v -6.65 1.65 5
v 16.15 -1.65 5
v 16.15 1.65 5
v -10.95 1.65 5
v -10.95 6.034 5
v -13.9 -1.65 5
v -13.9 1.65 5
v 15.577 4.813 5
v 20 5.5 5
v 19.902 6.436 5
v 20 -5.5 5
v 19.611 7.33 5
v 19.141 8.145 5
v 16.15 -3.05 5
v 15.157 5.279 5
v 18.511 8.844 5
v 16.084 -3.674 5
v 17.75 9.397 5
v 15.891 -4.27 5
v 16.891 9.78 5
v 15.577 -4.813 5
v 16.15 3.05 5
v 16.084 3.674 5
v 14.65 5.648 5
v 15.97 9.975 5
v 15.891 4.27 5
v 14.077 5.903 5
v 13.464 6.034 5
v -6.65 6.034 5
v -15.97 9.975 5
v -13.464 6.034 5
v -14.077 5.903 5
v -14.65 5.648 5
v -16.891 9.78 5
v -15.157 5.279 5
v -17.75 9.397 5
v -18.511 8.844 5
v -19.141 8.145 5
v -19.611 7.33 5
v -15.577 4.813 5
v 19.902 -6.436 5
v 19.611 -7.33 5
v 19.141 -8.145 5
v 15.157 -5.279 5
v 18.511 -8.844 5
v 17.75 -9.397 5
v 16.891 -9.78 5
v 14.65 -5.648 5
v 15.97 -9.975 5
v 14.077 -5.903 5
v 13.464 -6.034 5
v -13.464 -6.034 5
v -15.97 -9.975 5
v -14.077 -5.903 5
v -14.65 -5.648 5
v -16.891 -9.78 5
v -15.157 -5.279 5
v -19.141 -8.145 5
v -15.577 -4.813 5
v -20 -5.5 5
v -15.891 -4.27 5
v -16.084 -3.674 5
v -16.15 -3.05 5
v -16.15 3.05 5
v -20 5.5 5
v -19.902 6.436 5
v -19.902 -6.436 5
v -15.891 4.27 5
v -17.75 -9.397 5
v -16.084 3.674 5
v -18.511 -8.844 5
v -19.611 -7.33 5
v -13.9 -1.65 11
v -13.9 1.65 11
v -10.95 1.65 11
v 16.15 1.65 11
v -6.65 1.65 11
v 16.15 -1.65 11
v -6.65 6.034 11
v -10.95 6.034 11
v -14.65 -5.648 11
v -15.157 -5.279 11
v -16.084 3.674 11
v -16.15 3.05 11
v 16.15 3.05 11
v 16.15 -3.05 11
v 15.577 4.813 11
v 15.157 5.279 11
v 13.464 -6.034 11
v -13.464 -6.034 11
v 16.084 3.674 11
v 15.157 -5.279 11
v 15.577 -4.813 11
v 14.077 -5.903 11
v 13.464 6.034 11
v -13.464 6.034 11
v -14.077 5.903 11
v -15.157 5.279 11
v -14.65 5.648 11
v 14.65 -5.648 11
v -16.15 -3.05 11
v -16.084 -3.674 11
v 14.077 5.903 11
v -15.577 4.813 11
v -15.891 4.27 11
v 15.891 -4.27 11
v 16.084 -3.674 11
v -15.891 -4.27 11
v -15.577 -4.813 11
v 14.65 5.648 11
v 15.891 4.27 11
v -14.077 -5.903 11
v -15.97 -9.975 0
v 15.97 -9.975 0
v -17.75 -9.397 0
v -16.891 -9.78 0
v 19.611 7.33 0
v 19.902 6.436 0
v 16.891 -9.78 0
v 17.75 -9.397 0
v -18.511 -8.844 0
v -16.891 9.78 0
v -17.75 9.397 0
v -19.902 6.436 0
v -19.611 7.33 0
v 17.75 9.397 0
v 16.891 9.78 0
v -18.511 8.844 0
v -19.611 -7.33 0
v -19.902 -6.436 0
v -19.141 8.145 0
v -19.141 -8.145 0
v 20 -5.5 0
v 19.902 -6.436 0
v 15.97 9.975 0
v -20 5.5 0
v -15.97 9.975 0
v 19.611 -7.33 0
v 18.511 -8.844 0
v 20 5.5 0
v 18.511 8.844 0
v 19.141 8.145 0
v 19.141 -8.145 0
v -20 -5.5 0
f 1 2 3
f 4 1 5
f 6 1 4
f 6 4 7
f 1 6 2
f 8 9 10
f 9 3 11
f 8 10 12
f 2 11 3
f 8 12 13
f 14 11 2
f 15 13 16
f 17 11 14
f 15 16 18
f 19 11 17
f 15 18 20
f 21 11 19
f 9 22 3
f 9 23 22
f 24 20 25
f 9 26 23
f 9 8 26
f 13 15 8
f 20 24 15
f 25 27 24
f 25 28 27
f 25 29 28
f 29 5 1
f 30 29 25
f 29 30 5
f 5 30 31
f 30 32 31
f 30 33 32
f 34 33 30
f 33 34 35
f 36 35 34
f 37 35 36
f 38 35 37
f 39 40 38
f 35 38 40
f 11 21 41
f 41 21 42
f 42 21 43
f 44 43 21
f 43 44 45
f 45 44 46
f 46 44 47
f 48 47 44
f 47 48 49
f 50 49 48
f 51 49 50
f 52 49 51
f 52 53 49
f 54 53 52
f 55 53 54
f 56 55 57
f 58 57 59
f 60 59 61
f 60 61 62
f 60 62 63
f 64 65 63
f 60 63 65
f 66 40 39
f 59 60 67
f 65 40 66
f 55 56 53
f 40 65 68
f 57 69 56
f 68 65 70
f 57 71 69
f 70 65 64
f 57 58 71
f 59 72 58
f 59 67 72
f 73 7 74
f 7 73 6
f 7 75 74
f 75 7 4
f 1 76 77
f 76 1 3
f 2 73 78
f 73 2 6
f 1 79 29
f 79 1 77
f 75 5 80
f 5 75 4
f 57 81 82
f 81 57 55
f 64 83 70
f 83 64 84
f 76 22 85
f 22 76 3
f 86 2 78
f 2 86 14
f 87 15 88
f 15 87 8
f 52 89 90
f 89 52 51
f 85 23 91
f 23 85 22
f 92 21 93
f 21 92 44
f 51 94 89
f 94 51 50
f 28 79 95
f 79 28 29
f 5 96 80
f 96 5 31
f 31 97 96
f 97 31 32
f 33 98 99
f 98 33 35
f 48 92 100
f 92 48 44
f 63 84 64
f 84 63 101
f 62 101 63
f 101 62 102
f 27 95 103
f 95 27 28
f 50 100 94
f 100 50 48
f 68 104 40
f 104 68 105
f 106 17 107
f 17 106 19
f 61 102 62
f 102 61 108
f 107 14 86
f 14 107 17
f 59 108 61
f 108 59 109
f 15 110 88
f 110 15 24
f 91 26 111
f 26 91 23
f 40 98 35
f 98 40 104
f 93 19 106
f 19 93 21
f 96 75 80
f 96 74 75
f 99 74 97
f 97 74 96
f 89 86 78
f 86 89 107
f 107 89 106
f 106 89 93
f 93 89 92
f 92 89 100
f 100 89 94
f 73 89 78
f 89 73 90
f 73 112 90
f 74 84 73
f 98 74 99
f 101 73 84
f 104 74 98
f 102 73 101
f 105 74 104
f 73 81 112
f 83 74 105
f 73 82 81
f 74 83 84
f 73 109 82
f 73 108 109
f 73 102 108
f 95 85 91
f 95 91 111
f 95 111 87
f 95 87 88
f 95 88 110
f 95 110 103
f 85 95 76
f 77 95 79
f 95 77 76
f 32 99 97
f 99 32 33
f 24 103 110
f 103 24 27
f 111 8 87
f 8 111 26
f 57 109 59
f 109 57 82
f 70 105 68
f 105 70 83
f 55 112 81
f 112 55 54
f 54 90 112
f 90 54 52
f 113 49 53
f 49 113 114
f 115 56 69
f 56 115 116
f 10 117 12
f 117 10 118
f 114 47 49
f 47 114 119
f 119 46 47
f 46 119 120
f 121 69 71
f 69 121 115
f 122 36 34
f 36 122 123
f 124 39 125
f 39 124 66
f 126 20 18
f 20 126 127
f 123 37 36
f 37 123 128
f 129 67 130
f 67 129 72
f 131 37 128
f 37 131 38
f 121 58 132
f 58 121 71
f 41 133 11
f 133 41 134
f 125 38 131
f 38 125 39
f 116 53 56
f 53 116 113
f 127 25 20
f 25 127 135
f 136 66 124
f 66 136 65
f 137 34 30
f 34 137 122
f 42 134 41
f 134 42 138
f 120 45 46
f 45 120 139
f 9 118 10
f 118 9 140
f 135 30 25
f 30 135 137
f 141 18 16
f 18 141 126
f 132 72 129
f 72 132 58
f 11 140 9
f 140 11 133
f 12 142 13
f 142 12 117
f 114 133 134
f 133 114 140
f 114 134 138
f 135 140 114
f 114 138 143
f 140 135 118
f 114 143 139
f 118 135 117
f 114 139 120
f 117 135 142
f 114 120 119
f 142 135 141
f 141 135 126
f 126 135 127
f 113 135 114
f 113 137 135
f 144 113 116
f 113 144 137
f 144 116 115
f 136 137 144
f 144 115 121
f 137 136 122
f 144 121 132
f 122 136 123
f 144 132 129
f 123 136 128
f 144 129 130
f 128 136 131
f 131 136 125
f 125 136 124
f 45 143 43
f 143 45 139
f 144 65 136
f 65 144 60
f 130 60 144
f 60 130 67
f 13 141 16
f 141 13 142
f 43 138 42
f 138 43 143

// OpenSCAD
//-- two rounded flat cubes with a slot in the middle
//-- rear feet have an extra slot at right angle
//-- also left foot is mirror of right foot

x1=40;

y1=20;

th=5;
  
//-- OK, now we define the cylinders that are going to be at
//-- the four corners of our rounded corners box.

//-- the radius of the cylinders
box_corner_radius=4.5;

//-- The centers of the four corner cylinders

P1=[x1/2-box_corner_radius,y1/2-box_corner_radius,0];
P2=[x1/2-box_corner_radius,-y1/2+box_corner_radius,0];
P3=[-x1/2+box_corner_radius,-y1/2+box_corner_radius,0];
P4=[-x1/2+box_corner_radius,y1/2-box_corner_radius,0];

translate([0,0,th/2]) {
  hull() {
    translate(P1)
      cylinder(r=box_corner_radius,h=th,$fn=30,center=true);
      
    translate(P2)
      cylinder(r=box_corner_radius,h=th,$fn=30,center=true);
      
    translate(P3)
      cylinder(r=box_corner_radius,h=th,$fn=30,center=true);
      
    translate(P4)
      cylinder(r=box_corner_radius,h=th,$fn=30,center=true);
  }
}

//-- OK, now we define the cylinders that are going to be at
//-- the four corners of our 2nd rounded corners box.
x2=35.3;

y2=15.1;

th2=6;
//-- the radius of the cylinders
bc2=3;

//-- slot size
x3=27.8;
y3=3.3;
th3=th2+1;

//-- 2nd slot size


//-- The centers of the four corner cylinders

PT1=[x2/2-box_corner_radius,y2/2-box_corner_radius,0];
PT2=[x2/2-box_corner_radius,-y2/2+box_corner_radius,0];
PT3=[-x2/2+box_corner_radius,-y2/2+box_corner_radius,0];
PT4=[-x2/2+box_corner_radius,y2/2-box_corner_radius,0];

// -- uncoment to next lilne for the mirrored part
//mirror([1,0,0])
difference() {
  translate([0,0,th+th2/2]) {
    hull() {
      translate(PT1)
	cylinder(r=bc2,h=th2,$fn=30,center=true);
	
      translate(PT2)
	cylinder(r=bc2,h=th2,$fn=30,center=true);
	
      translate(PT3)
	cylinder(r=bc2,h=th2,$fn=30,center=true);
	
      translate(PT4)
	cylinder(r=bc2,h=th2,$fn=30,center=true);
    }
  }

  //-- Now we define the main T which we are going to hollow out  
  //-- Los cubos son las ranuras

  union() {
    translate([y3/2,0,th+th3/2])
      cube([x3+y3,y3,th3],center=true);
    translate([-8.8,x3/2,th+th3/2])
      cube([y3+1,x3,th3],center=true);
  }
}
